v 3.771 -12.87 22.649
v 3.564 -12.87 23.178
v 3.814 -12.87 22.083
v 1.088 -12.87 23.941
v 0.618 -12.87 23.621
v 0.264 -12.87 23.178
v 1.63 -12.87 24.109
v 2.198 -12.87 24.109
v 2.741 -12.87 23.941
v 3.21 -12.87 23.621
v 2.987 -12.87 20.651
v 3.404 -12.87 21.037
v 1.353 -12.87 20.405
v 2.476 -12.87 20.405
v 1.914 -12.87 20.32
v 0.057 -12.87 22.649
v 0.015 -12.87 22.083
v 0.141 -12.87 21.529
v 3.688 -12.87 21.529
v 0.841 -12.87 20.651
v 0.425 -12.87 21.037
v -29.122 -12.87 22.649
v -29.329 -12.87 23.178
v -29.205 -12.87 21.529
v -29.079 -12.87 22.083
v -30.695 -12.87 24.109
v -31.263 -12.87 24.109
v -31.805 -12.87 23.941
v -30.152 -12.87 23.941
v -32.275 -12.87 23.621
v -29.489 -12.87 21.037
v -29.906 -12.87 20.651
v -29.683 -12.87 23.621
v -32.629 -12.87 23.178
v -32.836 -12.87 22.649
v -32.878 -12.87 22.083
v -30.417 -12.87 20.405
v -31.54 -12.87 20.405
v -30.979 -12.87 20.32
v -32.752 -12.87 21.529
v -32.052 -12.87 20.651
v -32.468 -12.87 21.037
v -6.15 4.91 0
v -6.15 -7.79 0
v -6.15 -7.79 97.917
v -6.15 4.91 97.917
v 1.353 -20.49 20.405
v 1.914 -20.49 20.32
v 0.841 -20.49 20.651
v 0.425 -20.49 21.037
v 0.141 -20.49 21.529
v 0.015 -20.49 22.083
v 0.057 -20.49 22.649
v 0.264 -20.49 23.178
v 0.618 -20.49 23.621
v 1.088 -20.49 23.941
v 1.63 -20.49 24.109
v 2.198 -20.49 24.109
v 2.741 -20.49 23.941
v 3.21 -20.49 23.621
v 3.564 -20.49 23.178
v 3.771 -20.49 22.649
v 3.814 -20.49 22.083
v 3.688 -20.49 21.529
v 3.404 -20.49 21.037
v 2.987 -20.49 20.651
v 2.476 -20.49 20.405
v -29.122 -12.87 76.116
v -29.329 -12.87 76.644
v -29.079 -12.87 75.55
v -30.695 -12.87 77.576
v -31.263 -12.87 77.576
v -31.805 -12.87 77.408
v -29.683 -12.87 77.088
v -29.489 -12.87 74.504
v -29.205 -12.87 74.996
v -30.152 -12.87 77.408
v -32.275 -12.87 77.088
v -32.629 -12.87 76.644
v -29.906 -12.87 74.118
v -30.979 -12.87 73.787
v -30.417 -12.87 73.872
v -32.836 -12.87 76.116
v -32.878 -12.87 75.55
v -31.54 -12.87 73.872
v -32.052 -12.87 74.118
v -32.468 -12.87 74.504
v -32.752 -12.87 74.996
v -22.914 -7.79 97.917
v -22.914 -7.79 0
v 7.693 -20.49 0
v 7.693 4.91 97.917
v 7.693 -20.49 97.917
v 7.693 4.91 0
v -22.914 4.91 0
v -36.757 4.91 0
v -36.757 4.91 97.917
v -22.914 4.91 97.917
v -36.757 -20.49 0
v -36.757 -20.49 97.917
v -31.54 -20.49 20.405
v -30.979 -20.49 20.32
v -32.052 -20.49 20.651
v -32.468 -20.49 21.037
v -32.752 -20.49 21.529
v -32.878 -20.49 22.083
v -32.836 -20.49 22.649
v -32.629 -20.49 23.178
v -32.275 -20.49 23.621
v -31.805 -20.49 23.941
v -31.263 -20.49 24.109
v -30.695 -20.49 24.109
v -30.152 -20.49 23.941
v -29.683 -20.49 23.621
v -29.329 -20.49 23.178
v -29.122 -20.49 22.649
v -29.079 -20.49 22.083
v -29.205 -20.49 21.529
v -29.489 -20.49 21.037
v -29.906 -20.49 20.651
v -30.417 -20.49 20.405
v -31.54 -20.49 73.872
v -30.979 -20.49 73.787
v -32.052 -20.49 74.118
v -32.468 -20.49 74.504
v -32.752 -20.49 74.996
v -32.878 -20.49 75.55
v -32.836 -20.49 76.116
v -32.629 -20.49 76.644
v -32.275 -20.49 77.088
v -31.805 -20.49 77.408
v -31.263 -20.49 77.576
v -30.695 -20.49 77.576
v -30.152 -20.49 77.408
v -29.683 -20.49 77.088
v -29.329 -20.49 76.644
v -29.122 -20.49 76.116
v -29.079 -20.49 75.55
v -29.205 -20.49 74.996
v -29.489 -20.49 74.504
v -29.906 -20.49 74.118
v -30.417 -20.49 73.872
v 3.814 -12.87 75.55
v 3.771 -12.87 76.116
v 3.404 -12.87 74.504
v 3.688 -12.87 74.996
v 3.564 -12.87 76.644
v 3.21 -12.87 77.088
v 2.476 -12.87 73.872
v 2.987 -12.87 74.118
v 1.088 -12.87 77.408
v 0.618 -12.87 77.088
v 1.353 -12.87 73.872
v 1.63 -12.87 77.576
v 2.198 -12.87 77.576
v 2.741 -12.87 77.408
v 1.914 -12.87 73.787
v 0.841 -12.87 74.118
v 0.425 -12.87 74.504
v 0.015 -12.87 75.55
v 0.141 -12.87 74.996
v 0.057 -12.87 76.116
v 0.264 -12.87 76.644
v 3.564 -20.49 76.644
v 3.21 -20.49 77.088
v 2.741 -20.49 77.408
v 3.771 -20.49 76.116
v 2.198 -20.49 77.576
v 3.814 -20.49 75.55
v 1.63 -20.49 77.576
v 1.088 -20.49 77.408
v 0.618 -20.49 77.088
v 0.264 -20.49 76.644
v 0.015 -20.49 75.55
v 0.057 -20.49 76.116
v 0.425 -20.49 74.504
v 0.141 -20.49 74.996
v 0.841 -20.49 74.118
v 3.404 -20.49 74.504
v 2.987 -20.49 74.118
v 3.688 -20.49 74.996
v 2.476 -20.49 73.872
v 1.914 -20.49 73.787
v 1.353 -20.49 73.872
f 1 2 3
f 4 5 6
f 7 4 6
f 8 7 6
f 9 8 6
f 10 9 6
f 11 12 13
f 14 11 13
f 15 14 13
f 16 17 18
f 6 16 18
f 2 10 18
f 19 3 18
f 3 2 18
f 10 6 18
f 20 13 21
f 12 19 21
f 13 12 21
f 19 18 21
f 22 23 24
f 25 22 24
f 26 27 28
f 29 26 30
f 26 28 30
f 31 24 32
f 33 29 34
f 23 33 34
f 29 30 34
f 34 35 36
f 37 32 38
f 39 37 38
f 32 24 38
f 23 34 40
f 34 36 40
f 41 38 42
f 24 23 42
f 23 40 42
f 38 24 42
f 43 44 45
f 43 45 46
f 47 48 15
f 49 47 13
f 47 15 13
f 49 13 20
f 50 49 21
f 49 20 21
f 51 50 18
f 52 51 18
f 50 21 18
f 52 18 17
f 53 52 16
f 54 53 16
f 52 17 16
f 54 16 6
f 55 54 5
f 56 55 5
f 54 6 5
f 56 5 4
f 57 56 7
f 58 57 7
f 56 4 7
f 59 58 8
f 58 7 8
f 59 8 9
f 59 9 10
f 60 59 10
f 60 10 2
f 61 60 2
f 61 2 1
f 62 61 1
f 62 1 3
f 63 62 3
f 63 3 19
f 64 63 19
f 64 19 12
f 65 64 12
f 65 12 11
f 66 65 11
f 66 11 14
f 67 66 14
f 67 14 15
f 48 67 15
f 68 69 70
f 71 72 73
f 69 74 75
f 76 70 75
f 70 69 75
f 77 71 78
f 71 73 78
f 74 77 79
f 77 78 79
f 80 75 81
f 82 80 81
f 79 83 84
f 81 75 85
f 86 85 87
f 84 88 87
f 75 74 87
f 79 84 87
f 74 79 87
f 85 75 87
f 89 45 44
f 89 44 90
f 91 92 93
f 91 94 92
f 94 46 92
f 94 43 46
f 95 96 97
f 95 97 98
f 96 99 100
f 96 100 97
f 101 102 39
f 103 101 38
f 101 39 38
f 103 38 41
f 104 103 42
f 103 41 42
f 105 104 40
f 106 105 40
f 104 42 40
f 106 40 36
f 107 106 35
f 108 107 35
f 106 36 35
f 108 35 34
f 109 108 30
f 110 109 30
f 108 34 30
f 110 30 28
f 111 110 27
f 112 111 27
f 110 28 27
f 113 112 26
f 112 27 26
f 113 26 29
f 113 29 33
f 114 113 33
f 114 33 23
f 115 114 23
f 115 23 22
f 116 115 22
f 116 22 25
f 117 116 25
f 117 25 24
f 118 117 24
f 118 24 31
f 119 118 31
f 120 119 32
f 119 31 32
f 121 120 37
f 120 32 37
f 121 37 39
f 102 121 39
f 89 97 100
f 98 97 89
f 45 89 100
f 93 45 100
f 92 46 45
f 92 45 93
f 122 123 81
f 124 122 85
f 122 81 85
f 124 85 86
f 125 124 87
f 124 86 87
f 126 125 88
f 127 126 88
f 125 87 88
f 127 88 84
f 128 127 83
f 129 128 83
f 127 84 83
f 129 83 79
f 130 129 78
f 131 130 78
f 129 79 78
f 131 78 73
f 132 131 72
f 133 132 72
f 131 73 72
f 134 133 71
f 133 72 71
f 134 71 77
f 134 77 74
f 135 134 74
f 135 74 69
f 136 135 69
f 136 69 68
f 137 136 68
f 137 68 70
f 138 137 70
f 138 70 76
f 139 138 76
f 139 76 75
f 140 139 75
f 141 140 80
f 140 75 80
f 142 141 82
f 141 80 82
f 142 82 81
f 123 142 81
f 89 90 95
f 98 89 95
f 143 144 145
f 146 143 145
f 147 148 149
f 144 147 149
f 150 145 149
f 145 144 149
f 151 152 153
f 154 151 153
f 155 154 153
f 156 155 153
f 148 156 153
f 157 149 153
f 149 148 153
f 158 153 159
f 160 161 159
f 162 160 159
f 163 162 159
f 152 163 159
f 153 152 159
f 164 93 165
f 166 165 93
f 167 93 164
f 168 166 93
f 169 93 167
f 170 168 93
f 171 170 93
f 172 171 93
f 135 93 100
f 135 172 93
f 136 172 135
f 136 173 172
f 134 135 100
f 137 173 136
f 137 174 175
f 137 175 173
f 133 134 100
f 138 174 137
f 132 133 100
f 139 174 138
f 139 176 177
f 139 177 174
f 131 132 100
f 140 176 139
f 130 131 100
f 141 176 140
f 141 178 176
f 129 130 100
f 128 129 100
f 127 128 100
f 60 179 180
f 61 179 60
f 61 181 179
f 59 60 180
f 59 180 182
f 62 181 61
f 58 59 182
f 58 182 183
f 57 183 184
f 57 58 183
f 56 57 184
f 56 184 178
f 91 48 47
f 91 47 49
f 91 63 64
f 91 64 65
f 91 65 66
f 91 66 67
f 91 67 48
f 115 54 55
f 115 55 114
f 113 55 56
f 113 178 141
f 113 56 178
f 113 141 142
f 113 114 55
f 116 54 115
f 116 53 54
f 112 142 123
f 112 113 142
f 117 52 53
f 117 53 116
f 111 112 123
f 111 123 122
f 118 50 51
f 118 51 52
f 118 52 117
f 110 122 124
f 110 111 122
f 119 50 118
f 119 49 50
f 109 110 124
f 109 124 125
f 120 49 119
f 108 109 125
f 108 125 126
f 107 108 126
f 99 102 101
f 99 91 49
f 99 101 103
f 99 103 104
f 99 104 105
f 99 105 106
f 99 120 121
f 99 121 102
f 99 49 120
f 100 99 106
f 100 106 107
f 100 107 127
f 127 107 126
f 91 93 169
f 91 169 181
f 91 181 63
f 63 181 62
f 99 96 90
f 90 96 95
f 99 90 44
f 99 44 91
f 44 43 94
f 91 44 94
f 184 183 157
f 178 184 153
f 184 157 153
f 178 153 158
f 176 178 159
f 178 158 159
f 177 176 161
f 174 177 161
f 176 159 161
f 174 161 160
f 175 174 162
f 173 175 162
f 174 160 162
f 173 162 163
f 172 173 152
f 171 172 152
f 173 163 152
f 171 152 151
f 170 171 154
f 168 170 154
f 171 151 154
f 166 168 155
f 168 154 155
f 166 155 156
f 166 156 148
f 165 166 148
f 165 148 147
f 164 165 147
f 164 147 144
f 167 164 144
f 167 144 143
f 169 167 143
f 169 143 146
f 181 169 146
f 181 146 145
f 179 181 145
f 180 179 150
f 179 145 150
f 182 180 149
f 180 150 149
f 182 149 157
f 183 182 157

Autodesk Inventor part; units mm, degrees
ref_plane "YZ Plane" through (0, 0, 0) normal (1, 0, 0) x (0, 1, 0)
ref_plane "XZ Plane" through (0, 0, 0) normal (0, 1, 0) x (-1, 0, 0)
ref_plane "XY Plane" through (0, 0, 0) normal (0, 0, 1) x (1, 0, 0)
sketch "Sketch1" plane through (0, 0, 0) normal (0, 0, 1) x (1, 0, 0)
  line L0 (7.6927, 4.9102) -> (7.6927, -20.4898)
  line L1 (7.6927, -20.4898) -> (-36.7573, -20.4898)
  line L2 (-36.7573, -20.4898) -> (-36.7573, 4.9102)
  line L3 (-6.1503, 2.7687) -> (-6.1503, -7.7898)
  line L4 (-6.1503, -7.7898) -> (-22.9143, -7.7898)
  line L5 (-22.9143, -7.7898) -> (-22.9143, 2.7687)
  line L6 (-22.9143, 2.7687) -> (-22.9143, 4.9102)
  line L7 (-6.1503, 2.7687) -> (-6.1503, 4.9102)
  line L8 (-36.7573, 4.9102) -> (-22.9143, 4.9102)
  line L9 (-6.1503, 4.9102) -> (7.6927, 4.9102)
  point P0 (0, 0)
  dimension "d0" = 44.45
  dimension "d1" = 25.4
  dimension "d2" = 16.764
  dimension "d4" = 13.843
  dimension "d5" = 13.843
  dimension "d6" = 12.7
extrude "Extrusion1" add sketch "Sketch1" along normal blind 97.917
sketch "Sketch2" plane through (-36.7573, -20.4898, 0) normal (0, -1, 0) x (1, 0, 0)
  line L0 (44.45, 0) -> (44.45, 97.917) projected
  line L1 (0, 0) -> (0, 97.917) projected
  line L2 (0, 0) -> (44.45, 0) projected
  line L3 (0, 97.917) -> (44.45, 97.917) projected
  point P0 (36.7573, 0)
  point P1 (38.6715, 22.225)
  point P2 (5.7785, 22.225)
  point P3 (5.7785, 75.692)
  point P4 (38.6715, 75.692)
  dimension "d9" = 5.7785
  dimension "d10" = 5.7785
  dimension "d11" = 22.225
  dimension "d12" = 22.225
  dimension "d13" = 5.7785
  dimension "d14" = 5.7785
  dimension "d15" = 22.225
  dimension "d16" = 22.225
  dimension "d17" = 53.467
  dimension "d18" = 53.467
hole "Hole1" at (1.9142, -20.4898, 22.225) at (-30.9788, -20.4898, 22.225) at (-30.9788, -20.4898, 75.692) at (1.9142, -20.4898, 75.692) direction (0, 1, 0) diameter 3.81 depth 7.62
equation "\"d10\" = d9"
equation "\"d12\" = d11"
equation "\"d13\" = d9"
equation "\"d14\" = d9"
equation "\"d15\" = d11"
equation "\"d16\" = d11"
properties part number "Rail Slider"
